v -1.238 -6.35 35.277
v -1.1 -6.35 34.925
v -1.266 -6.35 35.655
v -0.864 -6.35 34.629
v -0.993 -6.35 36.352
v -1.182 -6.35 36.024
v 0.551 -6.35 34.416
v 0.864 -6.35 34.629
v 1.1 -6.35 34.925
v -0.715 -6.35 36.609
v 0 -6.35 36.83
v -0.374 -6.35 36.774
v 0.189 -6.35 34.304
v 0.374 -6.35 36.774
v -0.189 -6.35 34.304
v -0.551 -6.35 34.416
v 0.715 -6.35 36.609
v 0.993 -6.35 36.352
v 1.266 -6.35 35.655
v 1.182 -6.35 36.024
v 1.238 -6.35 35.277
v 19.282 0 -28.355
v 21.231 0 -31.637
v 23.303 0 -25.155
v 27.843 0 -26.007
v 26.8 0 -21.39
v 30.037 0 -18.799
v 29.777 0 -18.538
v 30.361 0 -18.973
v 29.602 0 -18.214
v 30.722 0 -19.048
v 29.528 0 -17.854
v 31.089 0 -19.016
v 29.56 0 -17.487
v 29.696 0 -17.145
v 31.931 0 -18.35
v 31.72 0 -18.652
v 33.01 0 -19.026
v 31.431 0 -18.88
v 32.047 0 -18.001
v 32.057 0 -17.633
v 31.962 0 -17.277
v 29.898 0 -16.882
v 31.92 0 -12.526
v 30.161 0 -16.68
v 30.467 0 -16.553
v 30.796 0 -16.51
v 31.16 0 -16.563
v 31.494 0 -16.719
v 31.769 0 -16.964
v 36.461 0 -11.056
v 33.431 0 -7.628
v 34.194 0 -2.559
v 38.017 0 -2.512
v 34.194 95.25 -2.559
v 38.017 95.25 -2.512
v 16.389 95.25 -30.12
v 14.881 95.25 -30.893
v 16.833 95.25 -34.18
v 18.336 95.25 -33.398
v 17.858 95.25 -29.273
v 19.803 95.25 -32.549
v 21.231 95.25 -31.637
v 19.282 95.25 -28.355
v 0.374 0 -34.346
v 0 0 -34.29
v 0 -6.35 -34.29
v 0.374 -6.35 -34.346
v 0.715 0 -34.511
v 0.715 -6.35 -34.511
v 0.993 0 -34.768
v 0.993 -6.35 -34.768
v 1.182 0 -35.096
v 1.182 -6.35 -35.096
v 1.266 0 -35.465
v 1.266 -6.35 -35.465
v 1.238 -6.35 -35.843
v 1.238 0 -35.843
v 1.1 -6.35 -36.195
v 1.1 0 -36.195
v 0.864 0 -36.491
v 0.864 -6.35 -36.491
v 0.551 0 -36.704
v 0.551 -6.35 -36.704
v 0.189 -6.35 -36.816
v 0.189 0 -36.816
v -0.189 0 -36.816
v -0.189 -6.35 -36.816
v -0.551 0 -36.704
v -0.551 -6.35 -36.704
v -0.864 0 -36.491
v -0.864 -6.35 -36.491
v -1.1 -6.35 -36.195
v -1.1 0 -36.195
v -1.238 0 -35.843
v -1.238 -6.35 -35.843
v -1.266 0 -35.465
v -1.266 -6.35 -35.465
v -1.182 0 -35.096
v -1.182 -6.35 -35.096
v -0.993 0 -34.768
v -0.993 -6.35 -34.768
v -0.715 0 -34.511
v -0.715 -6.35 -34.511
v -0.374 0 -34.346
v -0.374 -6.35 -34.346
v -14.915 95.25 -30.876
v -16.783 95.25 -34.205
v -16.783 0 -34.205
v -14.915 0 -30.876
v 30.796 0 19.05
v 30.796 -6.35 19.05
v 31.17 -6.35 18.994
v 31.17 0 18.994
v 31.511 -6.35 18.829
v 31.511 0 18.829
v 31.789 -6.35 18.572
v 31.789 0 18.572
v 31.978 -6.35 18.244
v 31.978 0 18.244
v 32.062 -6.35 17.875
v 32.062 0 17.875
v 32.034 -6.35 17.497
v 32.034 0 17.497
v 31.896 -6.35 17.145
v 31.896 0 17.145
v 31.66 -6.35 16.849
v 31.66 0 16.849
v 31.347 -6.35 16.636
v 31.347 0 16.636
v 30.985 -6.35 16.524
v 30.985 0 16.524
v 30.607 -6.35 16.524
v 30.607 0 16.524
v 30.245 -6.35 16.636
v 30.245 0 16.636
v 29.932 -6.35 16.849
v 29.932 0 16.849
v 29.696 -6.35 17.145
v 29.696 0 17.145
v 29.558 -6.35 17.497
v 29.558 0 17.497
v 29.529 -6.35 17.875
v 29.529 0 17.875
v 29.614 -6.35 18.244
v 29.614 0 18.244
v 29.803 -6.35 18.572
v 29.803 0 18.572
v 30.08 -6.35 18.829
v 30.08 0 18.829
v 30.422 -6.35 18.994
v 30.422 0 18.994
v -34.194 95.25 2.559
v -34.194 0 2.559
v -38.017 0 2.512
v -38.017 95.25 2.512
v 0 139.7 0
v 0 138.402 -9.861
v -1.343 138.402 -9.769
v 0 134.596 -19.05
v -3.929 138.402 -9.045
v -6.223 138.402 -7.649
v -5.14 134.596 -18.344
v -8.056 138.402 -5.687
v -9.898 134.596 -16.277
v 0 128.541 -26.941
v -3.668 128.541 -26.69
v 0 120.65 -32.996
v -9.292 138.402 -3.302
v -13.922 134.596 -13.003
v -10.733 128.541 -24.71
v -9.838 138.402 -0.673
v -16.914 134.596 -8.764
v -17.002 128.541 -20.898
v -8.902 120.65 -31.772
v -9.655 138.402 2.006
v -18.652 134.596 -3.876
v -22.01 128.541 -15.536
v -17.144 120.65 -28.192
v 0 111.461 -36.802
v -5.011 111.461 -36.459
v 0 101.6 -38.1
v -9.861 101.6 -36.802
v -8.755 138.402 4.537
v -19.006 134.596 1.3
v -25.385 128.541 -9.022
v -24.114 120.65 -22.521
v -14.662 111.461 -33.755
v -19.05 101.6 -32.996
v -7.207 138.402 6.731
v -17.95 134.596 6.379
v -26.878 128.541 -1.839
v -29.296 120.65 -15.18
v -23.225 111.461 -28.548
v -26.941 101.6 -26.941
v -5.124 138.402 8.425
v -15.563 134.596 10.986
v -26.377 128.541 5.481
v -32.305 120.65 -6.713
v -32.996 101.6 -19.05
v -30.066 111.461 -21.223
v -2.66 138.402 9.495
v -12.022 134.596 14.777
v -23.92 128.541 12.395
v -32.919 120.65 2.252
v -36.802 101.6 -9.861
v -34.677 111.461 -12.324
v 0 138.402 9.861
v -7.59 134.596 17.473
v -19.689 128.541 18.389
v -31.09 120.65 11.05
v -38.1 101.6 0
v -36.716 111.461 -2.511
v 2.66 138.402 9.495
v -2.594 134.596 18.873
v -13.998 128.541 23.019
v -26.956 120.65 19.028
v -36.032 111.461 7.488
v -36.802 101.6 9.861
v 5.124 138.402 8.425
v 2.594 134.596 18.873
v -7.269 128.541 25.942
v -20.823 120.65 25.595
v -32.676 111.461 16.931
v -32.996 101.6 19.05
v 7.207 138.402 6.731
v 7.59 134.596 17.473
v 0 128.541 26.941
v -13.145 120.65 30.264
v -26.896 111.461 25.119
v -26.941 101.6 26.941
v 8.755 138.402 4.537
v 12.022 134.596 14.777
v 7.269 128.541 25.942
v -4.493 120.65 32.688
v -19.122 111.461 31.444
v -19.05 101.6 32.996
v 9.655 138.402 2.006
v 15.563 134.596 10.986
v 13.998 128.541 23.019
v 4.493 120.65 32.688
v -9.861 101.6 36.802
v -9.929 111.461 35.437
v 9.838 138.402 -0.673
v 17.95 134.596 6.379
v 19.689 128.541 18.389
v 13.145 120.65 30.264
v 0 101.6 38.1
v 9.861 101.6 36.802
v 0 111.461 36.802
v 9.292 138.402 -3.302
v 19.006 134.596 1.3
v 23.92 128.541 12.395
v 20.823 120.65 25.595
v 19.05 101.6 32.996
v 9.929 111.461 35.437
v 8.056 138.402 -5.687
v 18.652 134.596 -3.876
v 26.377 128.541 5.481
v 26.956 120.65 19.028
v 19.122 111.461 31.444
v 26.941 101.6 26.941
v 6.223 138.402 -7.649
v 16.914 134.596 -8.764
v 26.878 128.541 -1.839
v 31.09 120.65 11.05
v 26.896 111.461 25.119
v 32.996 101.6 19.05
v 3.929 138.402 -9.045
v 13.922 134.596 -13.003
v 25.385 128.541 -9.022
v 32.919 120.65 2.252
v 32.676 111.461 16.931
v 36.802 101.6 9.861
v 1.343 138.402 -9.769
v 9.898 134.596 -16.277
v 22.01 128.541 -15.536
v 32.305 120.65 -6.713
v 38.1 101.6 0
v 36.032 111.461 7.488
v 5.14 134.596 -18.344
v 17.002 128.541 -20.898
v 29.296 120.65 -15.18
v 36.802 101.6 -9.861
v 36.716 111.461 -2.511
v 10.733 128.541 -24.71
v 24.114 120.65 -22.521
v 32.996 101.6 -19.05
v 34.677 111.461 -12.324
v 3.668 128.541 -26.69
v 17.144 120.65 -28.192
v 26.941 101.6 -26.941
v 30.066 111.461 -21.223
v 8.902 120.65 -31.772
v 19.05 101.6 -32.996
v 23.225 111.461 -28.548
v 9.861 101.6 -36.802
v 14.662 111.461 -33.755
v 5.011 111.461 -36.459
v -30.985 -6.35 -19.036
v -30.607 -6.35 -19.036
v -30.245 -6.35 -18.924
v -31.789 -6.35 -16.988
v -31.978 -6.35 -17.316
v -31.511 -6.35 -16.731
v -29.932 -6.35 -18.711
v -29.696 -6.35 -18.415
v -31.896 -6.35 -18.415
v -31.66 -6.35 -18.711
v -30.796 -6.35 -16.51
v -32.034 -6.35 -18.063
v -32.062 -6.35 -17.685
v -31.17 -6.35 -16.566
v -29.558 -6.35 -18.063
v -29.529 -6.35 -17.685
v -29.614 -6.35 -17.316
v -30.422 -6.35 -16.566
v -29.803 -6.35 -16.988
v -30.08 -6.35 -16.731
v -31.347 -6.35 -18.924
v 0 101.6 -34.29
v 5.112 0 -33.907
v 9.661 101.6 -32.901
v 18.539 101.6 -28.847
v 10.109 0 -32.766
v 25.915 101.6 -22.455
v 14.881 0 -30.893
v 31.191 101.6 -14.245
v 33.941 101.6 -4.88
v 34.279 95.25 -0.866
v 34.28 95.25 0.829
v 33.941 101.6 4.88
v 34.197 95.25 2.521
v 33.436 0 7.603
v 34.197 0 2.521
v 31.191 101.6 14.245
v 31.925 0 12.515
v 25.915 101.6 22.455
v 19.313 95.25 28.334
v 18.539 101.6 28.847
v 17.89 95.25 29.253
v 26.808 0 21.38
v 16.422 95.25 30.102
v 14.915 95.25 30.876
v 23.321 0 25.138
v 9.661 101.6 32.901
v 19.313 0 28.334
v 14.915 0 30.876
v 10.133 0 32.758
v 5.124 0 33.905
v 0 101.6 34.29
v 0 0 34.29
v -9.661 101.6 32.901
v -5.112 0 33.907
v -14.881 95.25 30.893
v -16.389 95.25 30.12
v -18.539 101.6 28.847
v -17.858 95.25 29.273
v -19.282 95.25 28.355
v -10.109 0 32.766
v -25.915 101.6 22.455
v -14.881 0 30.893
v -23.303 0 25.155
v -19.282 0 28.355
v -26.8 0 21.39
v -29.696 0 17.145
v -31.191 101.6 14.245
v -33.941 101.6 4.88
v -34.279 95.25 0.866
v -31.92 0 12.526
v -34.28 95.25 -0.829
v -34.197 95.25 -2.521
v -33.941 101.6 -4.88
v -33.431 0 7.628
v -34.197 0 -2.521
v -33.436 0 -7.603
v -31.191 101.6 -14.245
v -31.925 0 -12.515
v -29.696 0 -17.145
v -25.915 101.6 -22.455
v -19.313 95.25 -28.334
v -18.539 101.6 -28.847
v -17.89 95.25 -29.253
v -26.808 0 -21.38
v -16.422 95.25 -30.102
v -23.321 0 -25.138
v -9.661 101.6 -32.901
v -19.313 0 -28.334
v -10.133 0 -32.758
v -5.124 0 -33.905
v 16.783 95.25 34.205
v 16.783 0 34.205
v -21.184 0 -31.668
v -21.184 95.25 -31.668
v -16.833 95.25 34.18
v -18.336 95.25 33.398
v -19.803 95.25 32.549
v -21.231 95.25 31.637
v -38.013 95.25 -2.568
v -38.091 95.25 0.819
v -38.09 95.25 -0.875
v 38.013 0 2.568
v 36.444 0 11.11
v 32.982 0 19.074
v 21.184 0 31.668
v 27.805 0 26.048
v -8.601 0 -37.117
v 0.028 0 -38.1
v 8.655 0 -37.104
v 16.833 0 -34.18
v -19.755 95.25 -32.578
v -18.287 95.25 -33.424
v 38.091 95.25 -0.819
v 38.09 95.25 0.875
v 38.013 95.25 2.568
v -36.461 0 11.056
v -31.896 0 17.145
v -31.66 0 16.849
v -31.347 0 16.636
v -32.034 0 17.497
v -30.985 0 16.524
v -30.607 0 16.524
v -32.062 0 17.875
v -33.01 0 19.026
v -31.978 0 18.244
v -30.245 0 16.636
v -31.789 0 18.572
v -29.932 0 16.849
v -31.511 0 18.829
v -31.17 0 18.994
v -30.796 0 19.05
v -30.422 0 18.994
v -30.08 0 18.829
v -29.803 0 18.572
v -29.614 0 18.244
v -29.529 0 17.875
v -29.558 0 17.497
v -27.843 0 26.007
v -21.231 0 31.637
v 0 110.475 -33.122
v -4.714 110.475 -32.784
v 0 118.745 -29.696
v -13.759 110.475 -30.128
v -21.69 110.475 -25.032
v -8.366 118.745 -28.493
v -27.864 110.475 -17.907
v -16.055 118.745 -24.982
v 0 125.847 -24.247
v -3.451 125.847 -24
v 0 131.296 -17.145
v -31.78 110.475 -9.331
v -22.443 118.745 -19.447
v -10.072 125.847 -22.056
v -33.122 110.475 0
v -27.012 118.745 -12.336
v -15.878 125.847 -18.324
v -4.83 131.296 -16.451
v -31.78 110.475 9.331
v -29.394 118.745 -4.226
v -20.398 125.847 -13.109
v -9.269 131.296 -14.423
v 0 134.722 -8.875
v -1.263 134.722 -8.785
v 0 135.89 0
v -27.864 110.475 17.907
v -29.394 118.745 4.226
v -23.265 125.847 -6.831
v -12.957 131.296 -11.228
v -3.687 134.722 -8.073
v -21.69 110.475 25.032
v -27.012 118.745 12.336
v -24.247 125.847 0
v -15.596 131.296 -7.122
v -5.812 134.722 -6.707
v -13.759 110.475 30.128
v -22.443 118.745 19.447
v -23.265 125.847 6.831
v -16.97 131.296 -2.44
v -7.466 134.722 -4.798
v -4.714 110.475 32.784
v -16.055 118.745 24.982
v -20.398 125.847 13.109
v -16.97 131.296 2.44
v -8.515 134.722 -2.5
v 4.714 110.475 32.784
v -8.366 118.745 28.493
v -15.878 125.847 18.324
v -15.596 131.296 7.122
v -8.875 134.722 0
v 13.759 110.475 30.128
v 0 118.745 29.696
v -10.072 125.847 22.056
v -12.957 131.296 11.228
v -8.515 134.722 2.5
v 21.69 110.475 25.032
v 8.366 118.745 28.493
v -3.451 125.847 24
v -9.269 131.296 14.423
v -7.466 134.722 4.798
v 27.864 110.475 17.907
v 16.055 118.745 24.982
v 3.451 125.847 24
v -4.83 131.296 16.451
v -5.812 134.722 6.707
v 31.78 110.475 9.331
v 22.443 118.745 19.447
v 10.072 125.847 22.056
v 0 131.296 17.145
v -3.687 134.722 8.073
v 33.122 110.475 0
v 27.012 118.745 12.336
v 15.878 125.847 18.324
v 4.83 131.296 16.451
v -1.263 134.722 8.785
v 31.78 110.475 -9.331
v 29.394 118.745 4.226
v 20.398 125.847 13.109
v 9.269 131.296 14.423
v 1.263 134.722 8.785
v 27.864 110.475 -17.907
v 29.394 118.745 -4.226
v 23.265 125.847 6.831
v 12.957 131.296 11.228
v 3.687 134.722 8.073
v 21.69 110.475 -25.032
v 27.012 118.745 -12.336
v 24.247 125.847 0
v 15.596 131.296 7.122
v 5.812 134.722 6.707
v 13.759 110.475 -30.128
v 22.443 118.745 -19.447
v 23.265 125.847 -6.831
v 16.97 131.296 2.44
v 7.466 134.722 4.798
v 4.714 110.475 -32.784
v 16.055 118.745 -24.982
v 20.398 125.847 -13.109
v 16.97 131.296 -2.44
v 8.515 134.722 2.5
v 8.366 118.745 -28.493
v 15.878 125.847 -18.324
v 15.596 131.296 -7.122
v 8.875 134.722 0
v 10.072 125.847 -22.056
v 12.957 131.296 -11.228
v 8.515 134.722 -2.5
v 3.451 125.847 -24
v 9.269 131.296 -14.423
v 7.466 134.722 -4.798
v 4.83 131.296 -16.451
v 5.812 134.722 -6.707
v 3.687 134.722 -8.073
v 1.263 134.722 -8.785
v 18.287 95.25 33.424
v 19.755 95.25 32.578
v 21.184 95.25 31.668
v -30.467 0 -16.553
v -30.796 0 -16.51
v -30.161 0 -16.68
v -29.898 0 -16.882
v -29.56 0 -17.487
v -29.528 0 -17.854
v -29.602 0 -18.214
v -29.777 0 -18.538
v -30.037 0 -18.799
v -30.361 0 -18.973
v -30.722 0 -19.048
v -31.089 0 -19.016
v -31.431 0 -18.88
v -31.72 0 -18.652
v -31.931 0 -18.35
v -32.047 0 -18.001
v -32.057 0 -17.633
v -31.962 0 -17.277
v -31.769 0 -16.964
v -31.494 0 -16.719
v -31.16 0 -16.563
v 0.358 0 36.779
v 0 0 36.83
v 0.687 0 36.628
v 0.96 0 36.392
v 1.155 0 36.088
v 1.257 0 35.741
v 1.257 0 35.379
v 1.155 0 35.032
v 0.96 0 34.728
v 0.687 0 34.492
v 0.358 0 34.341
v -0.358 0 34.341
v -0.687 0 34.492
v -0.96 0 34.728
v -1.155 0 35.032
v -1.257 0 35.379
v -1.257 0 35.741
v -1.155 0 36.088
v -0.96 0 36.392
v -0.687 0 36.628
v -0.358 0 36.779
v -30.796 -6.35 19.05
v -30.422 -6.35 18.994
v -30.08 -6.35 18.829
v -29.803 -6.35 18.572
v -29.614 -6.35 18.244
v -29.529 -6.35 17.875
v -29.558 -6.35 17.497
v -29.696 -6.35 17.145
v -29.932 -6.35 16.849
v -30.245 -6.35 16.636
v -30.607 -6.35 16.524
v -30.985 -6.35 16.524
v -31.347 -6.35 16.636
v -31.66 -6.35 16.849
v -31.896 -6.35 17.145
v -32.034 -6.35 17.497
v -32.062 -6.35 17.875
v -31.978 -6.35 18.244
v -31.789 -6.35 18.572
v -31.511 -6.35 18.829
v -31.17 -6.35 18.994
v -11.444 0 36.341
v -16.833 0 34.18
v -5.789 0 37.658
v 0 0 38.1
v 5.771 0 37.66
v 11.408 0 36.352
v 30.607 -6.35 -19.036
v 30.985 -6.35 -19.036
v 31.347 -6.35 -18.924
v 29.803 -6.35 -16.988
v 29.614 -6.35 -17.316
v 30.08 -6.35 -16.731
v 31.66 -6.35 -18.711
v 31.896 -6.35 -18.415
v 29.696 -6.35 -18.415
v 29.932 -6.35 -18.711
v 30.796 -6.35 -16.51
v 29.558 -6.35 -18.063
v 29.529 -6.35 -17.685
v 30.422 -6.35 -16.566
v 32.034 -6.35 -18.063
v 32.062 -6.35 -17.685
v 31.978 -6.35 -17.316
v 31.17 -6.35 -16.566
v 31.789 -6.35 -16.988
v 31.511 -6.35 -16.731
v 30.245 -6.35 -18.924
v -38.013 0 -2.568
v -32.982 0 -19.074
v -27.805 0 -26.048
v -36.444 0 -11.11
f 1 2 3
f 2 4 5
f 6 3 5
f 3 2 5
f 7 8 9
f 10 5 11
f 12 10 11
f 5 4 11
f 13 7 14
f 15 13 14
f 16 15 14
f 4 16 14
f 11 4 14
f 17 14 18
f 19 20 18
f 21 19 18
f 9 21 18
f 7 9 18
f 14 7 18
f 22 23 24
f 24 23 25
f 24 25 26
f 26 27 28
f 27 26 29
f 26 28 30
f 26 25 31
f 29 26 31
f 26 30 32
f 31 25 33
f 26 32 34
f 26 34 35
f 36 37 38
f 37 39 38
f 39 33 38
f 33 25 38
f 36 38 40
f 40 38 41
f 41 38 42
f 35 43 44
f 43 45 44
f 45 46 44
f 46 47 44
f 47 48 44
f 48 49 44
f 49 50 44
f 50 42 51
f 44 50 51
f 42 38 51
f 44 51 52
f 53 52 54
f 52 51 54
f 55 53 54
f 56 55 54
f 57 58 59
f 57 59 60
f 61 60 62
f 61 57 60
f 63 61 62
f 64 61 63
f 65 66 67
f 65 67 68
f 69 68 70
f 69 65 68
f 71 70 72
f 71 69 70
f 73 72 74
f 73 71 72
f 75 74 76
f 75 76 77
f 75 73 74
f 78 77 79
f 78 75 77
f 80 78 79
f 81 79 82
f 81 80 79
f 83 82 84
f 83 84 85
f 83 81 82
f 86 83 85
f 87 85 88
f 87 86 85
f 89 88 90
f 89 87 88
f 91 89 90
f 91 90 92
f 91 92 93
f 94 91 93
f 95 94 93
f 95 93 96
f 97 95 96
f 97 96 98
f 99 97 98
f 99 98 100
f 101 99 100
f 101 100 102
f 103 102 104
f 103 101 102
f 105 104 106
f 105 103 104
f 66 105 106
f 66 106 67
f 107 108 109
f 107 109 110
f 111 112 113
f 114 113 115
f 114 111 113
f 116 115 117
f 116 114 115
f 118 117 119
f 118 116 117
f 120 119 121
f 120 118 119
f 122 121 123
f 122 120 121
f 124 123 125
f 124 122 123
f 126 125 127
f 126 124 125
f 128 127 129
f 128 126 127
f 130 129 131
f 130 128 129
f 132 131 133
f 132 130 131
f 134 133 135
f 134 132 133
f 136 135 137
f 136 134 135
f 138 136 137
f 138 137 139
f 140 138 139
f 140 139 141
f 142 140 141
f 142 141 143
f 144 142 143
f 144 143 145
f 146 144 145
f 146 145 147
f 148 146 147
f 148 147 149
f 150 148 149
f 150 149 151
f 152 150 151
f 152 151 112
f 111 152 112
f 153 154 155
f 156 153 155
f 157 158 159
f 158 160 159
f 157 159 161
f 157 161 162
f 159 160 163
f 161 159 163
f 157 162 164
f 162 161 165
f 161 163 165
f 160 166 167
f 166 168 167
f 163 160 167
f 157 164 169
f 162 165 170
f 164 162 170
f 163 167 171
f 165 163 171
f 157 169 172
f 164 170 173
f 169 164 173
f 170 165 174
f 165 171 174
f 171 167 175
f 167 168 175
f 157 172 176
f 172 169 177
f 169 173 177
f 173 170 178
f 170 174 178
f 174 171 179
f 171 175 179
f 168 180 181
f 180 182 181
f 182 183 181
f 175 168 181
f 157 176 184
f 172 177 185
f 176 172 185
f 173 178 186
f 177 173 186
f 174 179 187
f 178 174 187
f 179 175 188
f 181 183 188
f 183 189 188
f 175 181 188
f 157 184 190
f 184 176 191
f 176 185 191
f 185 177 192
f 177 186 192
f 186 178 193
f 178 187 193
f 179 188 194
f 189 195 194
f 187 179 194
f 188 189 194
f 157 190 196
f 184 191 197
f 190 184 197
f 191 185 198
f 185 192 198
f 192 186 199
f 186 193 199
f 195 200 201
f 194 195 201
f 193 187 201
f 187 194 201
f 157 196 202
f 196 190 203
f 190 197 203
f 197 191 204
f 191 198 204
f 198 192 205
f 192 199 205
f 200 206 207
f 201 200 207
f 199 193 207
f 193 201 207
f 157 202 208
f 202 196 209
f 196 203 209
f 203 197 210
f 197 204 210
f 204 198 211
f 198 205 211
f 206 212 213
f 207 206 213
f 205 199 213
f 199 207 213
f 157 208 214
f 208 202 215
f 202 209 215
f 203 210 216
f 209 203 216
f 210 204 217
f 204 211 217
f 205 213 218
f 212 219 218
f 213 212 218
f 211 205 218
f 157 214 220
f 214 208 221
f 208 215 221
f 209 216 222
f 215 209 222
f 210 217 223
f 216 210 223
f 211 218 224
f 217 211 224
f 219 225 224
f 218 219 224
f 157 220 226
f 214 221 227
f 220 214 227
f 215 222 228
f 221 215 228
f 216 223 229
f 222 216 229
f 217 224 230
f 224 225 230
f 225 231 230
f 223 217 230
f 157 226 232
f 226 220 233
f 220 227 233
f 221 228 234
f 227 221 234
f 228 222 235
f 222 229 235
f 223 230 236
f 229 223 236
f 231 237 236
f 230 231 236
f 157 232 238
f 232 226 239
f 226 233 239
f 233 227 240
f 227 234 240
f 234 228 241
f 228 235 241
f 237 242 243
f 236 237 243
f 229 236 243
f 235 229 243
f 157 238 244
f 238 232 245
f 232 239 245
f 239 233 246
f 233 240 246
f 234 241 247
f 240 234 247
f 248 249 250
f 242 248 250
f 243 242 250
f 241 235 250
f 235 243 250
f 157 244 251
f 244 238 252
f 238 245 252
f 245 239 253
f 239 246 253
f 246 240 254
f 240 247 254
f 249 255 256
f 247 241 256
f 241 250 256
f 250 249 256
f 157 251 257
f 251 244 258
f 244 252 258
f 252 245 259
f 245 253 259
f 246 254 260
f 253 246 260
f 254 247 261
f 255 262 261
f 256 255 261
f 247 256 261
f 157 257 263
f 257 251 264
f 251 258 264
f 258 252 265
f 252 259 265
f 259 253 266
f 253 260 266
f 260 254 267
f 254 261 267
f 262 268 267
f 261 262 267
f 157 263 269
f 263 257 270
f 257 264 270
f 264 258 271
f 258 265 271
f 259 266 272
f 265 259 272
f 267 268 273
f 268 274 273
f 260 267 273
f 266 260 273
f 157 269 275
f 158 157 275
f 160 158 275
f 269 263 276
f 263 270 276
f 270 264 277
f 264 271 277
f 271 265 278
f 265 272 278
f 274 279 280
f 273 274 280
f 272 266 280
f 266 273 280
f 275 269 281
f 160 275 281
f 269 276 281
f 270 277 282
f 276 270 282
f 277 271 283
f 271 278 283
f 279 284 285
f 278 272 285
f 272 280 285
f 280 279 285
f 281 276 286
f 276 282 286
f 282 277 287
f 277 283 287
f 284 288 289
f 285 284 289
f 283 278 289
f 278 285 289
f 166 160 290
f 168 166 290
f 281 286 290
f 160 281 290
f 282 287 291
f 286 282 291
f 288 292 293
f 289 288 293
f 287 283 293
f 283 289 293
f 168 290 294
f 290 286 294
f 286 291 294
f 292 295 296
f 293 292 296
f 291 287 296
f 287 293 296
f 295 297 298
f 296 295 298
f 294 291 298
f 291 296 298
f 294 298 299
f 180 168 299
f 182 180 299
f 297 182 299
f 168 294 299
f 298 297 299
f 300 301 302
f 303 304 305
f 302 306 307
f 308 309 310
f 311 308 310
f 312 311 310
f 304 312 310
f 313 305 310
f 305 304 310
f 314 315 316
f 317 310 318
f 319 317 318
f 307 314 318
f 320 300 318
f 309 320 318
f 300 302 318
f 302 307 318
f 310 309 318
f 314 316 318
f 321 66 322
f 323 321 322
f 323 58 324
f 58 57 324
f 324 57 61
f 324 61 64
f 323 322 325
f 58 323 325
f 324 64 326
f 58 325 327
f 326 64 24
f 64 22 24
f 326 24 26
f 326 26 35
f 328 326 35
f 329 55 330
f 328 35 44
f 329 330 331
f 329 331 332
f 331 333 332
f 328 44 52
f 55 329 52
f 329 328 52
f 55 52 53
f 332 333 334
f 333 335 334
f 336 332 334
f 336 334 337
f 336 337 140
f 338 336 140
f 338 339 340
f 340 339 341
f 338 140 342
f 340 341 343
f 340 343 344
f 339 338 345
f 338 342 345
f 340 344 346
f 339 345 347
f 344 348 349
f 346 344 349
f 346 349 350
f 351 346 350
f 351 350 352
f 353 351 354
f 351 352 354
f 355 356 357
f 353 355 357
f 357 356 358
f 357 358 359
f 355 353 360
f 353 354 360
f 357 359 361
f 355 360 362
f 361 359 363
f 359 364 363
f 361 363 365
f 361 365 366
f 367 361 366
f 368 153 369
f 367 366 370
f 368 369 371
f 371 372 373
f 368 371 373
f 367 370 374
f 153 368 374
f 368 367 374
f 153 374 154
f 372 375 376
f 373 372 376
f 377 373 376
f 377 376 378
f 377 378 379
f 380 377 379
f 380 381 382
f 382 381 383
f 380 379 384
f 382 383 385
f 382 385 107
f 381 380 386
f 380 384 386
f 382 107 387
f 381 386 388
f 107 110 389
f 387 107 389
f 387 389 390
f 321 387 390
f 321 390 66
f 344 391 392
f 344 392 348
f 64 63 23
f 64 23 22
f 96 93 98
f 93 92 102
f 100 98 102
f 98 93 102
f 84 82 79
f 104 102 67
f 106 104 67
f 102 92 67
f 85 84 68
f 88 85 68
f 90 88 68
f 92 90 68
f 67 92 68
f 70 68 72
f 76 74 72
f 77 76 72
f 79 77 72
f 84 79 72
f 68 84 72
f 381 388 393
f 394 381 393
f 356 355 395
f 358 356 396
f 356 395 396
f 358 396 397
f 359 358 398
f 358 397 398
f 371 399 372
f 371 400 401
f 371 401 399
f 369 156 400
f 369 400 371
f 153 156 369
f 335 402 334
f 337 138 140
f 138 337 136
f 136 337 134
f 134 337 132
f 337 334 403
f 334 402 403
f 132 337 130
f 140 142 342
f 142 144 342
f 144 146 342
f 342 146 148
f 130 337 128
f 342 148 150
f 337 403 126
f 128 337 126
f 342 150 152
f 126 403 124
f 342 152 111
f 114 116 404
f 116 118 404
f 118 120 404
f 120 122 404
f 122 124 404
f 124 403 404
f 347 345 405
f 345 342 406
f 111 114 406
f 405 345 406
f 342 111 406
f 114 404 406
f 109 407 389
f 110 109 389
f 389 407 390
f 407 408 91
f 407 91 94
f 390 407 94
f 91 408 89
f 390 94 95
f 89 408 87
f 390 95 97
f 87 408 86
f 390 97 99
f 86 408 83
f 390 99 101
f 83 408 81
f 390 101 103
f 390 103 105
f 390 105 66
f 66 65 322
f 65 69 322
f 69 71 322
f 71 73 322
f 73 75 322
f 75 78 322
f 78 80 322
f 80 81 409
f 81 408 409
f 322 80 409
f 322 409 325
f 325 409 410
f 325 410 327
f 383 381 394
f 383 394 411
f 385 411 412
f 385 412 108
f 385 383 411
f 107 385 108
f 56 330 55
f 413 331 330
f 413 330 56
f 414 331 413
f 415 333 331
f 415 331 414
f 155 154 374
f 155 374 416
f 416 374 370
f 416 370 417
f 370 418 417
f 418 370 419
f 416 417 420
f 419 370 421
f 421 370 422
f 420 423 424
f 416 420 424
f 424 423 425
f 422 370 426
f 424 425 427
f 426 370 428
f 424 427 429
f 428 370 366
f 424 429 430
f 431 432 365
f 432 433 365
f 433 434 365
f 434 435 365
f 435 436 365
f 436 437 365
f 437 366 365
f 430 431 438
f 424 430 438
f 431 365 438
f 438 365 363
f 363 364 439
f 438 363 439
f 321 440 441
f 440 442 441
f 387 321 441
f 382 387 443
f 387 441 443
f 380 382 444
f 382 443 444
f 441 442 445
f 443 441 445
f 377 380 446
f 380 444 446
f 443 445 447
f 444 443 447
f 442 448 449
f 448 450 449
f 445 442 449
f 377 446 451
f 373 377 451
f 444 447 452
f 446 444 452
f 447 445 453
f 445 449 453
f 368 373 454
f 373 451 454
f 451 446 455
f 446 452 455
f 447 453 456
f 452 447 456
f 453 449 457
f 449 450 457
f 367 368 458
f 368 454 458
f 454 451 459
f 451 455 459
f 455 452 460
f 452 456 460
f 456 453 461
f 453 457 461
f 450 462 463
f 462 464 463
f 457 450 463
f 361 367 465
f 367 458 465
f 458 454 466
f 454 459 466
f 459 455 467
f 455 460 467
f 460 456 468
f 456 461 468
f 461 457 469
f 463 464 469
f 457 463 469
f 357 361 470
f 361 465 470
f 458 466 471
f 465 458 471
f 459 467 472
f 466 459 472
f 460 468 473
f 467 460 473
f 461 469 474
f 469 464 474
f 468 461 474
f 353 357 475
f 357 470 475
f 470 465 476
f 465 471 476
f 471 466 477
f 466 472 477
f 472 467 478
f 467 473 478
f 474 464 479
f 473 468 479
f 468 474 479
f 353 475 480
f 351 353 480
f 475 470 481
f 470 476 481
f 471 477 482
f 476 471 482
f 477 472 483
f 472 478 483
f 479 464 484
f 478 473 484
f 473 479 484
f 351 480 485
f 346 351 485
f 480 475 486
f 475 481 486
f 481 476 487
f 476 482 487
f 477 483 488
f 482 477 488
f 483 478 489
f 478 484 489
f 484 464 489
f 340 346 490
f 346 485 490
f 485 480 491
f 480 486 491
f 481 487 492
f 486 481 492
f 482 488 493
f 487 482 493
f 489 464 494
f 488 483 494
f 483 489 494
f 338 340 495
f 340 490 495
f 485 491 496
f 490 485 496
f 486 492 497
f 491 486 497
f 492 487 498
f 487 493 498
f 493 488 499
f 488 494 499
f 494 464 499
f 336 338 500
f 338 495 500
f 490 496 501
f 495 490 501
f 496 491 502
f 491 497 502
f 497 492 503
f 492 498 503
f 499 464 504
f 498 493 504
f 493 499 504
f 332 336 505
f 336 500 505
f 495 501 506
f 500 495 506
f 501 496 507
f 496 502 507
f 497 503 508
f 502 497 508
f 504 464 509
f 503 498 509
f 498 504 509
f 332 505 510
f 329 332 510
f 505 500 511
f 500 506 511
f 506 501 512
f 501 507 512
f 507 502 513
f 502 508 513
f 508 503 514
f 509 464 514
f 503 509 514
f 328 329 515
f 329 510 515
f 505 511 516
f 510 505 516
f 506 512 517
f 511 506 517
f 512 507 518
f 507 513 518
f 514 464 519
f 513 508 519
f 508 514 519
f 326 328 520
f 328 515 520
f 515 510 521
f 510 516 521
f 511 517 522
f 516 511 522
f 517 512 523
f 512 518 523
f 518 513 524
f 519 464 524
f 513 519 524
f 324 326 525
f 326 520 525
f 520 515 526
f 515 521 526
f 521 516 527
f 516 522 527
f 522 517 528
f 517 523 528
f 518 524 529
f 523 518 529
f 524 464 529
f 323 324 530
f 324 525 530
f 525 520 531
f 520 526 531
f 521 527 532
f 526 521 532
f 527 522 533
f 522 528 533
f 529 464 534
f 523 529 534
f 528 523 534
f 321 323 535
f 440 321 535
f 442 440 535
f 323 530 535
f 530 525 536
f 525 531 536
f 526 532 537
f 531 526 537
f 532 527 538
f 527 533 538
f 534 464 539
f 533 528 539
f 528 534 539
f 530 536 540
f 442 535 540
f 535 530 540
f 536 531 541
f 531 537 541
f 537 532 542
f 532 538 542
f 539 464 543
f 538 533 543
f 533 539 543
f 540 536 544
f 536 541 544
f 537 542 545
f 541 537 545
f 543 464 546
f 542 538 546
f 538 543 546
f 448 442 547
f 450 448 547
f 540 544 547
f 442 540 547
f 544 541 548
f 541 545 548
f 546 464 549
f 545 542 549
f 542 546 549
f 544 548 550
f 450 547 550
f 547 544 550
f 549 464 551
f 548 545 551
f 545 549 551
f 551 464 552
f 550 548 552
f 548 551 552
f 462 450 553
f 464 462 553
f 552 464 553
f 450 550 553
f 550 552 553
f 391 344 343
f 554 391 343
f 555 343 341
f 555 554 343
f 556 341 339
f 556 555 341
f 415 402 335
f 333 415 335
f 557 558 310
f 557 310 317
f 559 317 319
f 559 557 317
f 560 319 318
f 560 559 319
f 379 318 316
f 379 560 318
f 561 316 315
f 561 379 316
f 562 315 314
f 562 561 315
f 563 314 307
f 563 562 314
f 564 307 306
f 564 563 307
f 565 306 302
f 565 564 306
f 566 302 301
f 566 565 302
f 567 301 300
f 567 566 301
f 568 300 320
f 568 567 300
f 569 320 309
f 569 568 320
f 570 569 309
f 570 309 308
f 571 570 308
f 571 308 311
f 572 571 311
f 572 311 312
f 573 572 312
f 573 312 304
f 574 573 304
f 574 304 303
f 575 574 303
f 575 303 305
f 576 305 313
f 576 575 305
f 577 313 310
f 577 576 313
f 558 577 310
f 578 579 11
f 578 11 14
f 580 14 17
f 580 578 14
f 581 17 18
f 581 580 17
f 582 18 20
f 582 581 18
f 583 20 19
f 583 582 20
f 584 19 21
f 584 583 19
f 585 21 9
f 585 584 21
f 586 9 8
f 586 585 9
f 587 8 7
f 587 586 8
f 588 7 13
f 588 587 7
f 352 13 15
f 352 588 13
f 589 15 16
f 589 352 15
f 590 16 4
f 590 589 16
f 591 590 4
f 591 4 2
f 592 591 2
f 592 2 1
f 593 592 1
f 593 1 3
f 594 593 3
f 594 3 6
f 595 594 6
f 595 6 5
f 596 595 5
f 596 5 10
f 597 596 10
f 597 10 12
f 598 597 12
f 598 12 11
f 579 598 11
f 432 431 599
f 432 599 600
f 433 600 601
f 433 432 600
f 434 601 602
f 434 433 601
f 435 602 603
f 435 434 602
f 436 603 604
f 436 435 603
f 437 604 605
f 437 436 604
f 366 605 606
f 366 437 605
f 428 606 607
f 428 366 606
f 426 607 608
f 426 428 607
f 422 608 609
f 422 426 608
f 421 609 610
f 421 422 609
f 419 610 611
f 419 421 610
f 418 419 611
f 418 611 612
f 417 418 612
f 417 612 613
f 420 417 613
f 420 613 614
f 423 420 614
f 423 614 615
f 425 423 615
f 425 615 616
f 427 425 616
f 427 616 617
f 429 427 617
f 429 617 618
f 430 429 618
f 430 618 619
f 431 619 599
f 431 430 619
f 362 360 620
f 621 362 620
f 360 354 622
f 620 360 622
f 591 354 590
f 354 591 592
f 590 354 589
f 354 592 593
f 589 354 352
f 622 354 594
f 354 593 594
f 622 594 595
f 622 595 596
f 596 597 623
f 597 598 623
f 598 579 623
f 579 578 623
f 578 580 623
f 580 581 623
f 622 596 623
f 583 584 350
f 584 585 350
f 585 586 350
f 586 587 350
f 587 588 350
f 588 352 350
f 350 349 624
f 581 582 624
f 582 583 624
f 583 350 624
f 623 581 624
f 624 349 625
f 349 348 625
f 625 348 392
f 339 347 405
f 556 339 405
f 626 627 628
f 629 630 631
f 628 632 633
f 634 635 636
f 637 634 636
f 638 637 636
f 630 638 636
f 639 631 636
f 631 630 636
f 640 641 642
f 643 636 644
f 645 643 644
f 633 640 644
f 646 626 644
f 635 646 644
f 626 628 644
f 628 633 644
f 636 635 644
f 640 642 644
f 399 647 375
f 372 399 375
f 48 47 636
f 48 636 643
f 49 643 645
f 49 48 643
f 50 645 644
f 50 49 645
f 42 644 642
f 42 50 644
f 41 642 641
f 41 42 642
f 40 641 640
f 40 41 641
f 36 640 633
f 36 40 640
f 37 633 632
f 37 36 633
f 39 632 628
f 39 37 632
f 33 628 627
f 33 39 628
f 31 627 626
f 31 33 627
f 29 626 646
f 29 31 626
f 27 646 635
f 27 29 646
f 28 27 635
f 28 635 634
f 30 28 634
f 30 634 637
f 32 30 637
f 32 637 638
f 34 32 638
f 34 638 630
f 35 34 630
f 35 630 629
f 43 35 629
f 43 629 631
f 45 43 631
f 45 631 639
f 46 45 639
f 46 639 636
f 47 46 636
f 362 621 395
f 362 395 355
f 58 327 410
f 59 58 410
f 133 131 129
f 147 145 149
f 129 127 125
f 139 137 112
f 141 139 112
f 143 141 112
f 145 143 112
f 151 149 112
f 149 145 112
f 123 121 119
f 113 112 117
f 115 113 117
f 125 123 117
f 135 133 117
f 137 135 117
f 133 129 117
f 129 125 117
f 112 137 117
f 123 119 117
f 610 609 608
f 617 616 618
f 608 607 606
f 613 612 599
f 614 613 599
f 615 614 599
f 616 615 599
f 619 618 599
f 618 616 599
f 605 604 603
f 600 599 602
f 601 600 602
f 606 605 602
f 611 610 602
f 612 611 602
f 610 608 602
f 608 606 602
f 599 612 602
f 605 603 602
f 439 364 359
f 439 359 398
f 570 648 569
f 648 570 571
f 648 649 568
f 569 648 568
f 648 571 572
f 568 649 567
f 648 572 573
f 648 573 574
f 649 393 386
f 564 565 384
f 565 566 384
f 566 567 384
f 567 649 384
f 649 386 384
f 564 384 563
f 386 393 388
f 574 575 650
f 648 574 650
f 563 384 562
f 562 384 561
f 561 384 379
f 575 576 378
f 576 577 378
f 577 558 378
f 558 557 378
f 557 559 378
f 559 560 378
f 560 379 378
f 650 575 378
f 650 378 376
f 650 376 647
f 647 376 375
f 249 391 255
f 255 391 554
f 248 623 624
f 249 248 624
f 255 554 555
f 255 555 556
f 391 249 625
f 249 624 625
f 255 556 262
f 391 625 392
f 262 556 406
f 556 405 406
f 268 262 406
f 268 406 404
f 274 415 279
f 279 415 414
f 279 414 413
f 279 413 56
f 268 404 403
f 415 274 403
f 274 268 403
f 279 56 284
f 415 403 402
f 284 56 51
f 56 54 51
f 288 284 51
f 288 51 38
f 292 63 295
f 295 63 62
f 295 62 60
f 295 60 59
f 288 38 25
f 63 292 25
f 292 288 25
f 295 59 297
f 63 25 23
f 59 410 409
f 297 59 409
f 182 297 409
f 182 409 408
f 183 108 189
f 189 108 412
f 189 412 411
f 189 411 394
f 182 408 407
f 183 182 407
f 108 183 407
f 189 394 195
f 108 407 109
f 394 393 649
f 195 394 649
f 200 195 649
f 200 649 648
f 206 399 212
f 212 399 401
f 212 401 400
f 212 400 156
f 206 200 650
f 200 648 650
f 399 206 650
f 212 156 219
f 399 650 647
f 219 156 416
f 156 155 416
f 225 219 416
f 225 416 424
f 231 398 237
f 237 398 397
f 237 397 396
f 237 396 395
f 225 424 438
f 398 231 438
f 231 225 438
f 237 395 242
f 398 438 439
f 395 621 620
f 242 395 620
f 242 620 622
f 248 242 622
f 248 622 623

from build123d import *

# Parameters (mm, degrees)
SKETCH1_R           = 38.1
BOSS_EXTRUDE1_DEPTH = 101.6
SKETCH3_R           = 34.29
CUT_EXTRUDE2_DEPTH  = 101.6
SKETCH4_R           = 1.27
BOSS_EXTRUDE2_DEPTH = 6.35
CUT_EXTRUDE5_DEPTH  = 95.25


with BuildPart() as part:
    # Sketch1 → Boss-Extrude1 (new body)
    with BuildSketch(Plane(origin=(0, 0, 0), x_dir=(1, 0, 0), z_dir=(0, 1, 0))):
        with Locations(Location((0, 0, 0), (0, 0, 270))):
            Circle(SKETCH1_R)
    extrude(amount=BOSS_EXTRUDE1_DEPTH)

    # Sketch2 → Revolve1 (revolve)
    with BuildSketch(Plane(origin=(0, 0, 0), x_dir=(0, 0, -1), z_dir=(1, 0, 0))):
        with BuildLine():
            Line((38.1, 101.6), (34.29, 101.6))
            ThreePointArc((34.29, 101.6), (24.246691527, 125.846691527), (0, 135.89))
            Line((0, 135.89), (0, 139.7))
            ThreePointArc((0, 139.7), (26.940768363, 128.540768363), (38.1, 101.6))
        make_face()
    revolve(axis=Axis((0, 0, 0), (0, 1, 0)))

    # Sketch3 → Cut-Extrude2 (cut)
    with BuildSketch(Plane.XZ):
        with Locations(Location((0, 0, 0), (0, 0, 270))):
            Circle(SKETCH3_R)
    extrude(amount=-CUT_EXTRUDE2_DEPTH, mode=Mode.SUBTRACT)

    # Sketch4 → Boss-Extrude2 (add)
    with BuildSketch(Plane(origin=(0, 0, 0), x_dir=(1, 0, 0), z_dir=(0, 1, 0))):
        with Locations(Location((0, -35.56, 0), (0, 0, 270))):
            Circle(SKETCH4_R)
        with Locations(Location((-30.795863359, -17.78, 0), (0, 0, 270))):
            Circle(SKETCH4_R)
        with Locations(Location((-30.795863359, 17.78, 0), (0, 0, 270))):
            Circle(SKETCH4_R)
        with Locations(Location((0, 35.56, 0), (0, 0, 270))):
            Circle(SKETCH4_R)
        with Locations(Location((30.795863359, 17.78, 0), (0, 0, 270))):
            Circle(SKETCH4_R)
        with Locations(Location((30.795863359, -17.78, 0), (0, 0, 270))):
            Circle(SKETCH4_R)
    extrude(amount=-BOSS_EXTRUDE2_DEPTH)

    # Sketch5 → Cut-Extrude5 (cut)
    with BuildSketch(Plane.XZ):
        Polygon((-21.563277102, 32.196696757), (-17.195234057, 34.790265717), (-14.171362758, 29.697515071), (-18.539405803, 27.103946111), align=None)
        Polygon((14.203002973, 29.607569452), (18.633121102, 27.12151769), (21.531636887, 32.286642376), (17.101518758, 34.772694138), align=None)
        Polygon((32.742408776, 2.503623341), (32.804483859, -2.575997381), (38.726870944, -2.503623341), (38.66479586, 2.575997381), align=None)
        Polygon((18.539405803, -27.103946111), (14.171362758, -29.697515071), (17.195234057, -34.790265717), (21.563277102, -32.196696757), align=None)
        Polygon((-14.203002973, -29.607569452), (-18.633121102, -27.12151769), (-21.531636887, -32.286642376), (-17.101518758, -34.772694138), align=None)
        Polygon((-32.742408776, -2.503623341), (-32.804483859, 2.575997381), (-38.726870944, 2.503623341), (-38.66479586, -2.575997381), align=None)
    extrude(amount=-CUT_EXTRUDE5_DEPTH, mode=Mode.SUBTRACT)


solid = part.part
